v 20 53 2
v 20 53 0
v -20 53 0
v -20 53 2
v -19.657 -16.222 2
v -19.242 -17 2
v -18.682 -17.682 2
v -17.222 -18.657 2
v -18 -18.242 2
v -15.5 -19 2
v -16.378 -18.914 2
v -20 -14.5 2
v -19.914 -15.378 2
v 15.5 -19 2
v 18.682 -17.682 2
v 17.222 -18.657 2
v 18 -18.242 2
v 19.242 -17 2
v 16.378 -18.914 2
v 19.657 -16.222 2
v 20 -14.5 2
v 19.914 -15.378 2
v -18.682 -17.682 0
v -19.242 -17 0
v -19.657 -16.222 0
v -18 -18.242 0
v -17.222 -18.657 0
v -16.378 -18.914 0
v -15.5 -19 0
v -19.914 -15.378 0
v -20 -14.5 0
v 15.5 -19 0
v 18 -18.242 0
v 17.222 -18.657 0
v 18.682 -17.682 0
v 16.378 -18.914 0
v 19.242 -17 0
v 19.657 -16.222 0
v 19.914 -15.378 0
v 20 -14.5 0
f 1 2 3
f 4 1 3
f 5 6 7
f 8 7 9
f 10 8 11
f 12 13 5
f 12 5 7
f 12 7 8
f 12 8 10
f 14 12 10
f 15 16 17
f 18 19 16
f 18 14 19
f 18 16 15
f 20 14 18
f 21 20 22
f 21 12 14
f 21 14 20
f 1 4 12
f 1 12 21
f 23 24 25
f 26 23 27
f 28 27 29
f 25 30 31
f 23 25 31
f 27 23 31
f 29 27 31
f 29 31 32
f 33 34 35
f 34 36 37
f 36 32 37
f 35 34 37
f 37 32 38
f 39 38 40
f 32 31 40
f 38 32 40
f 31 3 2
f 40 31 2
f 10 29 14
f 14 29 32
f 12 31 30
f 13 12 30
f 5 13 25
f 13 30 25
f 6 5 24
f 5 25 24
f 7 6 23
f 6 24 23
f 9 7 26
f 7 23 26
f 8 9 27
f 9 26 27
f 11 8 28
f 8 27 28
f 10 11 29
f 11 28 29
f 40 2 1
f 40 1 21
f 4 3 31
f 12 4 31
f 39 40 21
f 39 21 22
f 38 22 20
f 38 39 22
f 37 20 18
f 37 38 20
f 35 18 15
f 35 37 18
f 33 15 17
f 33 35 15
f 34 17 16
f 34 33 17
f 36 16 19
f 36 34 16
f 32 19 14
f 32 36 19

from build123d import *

# Parameters (mm, degrees)
EXTRUDE_DEPTH = 2


with BuildPart() as illuminationlidcut:
    # Clone2D → Extrude (new body)
    with BuildSketch(Plane.XY):
        with BuildLine():
            Line((15.5, -19), (0, -19))
            Line((0, -19), (0, 53))
            Line((0, 53), (20, 53))
            Line((20, 53), (20, -14.5))
            ThreePointArc((20, -14.5), (18.681981, -17.681981), (15.5, -19))
        make_face()
    extrude(amount=EXTRUDE_DEPTH)


with BuildPart() as part_mirroring023004:
    # Part__Mirroring023004: instance of IlluminationLidCut
    add(illuminationlidcut.part.mirror(Plane(origin=(0, 0, 0), x_dir=(0, -1, 0), z_dir=(1, 0, 0))))


with BuildPart() as illuminationlidcut001:
    # Fusion004 base: copy of IlluminationLidCut
    add(illuminationlidcut.part)

    # Fusion004: union Part__Mirroring023004
    add(part_mirroring023004.part)


solid = illuminationlidcut001.part
